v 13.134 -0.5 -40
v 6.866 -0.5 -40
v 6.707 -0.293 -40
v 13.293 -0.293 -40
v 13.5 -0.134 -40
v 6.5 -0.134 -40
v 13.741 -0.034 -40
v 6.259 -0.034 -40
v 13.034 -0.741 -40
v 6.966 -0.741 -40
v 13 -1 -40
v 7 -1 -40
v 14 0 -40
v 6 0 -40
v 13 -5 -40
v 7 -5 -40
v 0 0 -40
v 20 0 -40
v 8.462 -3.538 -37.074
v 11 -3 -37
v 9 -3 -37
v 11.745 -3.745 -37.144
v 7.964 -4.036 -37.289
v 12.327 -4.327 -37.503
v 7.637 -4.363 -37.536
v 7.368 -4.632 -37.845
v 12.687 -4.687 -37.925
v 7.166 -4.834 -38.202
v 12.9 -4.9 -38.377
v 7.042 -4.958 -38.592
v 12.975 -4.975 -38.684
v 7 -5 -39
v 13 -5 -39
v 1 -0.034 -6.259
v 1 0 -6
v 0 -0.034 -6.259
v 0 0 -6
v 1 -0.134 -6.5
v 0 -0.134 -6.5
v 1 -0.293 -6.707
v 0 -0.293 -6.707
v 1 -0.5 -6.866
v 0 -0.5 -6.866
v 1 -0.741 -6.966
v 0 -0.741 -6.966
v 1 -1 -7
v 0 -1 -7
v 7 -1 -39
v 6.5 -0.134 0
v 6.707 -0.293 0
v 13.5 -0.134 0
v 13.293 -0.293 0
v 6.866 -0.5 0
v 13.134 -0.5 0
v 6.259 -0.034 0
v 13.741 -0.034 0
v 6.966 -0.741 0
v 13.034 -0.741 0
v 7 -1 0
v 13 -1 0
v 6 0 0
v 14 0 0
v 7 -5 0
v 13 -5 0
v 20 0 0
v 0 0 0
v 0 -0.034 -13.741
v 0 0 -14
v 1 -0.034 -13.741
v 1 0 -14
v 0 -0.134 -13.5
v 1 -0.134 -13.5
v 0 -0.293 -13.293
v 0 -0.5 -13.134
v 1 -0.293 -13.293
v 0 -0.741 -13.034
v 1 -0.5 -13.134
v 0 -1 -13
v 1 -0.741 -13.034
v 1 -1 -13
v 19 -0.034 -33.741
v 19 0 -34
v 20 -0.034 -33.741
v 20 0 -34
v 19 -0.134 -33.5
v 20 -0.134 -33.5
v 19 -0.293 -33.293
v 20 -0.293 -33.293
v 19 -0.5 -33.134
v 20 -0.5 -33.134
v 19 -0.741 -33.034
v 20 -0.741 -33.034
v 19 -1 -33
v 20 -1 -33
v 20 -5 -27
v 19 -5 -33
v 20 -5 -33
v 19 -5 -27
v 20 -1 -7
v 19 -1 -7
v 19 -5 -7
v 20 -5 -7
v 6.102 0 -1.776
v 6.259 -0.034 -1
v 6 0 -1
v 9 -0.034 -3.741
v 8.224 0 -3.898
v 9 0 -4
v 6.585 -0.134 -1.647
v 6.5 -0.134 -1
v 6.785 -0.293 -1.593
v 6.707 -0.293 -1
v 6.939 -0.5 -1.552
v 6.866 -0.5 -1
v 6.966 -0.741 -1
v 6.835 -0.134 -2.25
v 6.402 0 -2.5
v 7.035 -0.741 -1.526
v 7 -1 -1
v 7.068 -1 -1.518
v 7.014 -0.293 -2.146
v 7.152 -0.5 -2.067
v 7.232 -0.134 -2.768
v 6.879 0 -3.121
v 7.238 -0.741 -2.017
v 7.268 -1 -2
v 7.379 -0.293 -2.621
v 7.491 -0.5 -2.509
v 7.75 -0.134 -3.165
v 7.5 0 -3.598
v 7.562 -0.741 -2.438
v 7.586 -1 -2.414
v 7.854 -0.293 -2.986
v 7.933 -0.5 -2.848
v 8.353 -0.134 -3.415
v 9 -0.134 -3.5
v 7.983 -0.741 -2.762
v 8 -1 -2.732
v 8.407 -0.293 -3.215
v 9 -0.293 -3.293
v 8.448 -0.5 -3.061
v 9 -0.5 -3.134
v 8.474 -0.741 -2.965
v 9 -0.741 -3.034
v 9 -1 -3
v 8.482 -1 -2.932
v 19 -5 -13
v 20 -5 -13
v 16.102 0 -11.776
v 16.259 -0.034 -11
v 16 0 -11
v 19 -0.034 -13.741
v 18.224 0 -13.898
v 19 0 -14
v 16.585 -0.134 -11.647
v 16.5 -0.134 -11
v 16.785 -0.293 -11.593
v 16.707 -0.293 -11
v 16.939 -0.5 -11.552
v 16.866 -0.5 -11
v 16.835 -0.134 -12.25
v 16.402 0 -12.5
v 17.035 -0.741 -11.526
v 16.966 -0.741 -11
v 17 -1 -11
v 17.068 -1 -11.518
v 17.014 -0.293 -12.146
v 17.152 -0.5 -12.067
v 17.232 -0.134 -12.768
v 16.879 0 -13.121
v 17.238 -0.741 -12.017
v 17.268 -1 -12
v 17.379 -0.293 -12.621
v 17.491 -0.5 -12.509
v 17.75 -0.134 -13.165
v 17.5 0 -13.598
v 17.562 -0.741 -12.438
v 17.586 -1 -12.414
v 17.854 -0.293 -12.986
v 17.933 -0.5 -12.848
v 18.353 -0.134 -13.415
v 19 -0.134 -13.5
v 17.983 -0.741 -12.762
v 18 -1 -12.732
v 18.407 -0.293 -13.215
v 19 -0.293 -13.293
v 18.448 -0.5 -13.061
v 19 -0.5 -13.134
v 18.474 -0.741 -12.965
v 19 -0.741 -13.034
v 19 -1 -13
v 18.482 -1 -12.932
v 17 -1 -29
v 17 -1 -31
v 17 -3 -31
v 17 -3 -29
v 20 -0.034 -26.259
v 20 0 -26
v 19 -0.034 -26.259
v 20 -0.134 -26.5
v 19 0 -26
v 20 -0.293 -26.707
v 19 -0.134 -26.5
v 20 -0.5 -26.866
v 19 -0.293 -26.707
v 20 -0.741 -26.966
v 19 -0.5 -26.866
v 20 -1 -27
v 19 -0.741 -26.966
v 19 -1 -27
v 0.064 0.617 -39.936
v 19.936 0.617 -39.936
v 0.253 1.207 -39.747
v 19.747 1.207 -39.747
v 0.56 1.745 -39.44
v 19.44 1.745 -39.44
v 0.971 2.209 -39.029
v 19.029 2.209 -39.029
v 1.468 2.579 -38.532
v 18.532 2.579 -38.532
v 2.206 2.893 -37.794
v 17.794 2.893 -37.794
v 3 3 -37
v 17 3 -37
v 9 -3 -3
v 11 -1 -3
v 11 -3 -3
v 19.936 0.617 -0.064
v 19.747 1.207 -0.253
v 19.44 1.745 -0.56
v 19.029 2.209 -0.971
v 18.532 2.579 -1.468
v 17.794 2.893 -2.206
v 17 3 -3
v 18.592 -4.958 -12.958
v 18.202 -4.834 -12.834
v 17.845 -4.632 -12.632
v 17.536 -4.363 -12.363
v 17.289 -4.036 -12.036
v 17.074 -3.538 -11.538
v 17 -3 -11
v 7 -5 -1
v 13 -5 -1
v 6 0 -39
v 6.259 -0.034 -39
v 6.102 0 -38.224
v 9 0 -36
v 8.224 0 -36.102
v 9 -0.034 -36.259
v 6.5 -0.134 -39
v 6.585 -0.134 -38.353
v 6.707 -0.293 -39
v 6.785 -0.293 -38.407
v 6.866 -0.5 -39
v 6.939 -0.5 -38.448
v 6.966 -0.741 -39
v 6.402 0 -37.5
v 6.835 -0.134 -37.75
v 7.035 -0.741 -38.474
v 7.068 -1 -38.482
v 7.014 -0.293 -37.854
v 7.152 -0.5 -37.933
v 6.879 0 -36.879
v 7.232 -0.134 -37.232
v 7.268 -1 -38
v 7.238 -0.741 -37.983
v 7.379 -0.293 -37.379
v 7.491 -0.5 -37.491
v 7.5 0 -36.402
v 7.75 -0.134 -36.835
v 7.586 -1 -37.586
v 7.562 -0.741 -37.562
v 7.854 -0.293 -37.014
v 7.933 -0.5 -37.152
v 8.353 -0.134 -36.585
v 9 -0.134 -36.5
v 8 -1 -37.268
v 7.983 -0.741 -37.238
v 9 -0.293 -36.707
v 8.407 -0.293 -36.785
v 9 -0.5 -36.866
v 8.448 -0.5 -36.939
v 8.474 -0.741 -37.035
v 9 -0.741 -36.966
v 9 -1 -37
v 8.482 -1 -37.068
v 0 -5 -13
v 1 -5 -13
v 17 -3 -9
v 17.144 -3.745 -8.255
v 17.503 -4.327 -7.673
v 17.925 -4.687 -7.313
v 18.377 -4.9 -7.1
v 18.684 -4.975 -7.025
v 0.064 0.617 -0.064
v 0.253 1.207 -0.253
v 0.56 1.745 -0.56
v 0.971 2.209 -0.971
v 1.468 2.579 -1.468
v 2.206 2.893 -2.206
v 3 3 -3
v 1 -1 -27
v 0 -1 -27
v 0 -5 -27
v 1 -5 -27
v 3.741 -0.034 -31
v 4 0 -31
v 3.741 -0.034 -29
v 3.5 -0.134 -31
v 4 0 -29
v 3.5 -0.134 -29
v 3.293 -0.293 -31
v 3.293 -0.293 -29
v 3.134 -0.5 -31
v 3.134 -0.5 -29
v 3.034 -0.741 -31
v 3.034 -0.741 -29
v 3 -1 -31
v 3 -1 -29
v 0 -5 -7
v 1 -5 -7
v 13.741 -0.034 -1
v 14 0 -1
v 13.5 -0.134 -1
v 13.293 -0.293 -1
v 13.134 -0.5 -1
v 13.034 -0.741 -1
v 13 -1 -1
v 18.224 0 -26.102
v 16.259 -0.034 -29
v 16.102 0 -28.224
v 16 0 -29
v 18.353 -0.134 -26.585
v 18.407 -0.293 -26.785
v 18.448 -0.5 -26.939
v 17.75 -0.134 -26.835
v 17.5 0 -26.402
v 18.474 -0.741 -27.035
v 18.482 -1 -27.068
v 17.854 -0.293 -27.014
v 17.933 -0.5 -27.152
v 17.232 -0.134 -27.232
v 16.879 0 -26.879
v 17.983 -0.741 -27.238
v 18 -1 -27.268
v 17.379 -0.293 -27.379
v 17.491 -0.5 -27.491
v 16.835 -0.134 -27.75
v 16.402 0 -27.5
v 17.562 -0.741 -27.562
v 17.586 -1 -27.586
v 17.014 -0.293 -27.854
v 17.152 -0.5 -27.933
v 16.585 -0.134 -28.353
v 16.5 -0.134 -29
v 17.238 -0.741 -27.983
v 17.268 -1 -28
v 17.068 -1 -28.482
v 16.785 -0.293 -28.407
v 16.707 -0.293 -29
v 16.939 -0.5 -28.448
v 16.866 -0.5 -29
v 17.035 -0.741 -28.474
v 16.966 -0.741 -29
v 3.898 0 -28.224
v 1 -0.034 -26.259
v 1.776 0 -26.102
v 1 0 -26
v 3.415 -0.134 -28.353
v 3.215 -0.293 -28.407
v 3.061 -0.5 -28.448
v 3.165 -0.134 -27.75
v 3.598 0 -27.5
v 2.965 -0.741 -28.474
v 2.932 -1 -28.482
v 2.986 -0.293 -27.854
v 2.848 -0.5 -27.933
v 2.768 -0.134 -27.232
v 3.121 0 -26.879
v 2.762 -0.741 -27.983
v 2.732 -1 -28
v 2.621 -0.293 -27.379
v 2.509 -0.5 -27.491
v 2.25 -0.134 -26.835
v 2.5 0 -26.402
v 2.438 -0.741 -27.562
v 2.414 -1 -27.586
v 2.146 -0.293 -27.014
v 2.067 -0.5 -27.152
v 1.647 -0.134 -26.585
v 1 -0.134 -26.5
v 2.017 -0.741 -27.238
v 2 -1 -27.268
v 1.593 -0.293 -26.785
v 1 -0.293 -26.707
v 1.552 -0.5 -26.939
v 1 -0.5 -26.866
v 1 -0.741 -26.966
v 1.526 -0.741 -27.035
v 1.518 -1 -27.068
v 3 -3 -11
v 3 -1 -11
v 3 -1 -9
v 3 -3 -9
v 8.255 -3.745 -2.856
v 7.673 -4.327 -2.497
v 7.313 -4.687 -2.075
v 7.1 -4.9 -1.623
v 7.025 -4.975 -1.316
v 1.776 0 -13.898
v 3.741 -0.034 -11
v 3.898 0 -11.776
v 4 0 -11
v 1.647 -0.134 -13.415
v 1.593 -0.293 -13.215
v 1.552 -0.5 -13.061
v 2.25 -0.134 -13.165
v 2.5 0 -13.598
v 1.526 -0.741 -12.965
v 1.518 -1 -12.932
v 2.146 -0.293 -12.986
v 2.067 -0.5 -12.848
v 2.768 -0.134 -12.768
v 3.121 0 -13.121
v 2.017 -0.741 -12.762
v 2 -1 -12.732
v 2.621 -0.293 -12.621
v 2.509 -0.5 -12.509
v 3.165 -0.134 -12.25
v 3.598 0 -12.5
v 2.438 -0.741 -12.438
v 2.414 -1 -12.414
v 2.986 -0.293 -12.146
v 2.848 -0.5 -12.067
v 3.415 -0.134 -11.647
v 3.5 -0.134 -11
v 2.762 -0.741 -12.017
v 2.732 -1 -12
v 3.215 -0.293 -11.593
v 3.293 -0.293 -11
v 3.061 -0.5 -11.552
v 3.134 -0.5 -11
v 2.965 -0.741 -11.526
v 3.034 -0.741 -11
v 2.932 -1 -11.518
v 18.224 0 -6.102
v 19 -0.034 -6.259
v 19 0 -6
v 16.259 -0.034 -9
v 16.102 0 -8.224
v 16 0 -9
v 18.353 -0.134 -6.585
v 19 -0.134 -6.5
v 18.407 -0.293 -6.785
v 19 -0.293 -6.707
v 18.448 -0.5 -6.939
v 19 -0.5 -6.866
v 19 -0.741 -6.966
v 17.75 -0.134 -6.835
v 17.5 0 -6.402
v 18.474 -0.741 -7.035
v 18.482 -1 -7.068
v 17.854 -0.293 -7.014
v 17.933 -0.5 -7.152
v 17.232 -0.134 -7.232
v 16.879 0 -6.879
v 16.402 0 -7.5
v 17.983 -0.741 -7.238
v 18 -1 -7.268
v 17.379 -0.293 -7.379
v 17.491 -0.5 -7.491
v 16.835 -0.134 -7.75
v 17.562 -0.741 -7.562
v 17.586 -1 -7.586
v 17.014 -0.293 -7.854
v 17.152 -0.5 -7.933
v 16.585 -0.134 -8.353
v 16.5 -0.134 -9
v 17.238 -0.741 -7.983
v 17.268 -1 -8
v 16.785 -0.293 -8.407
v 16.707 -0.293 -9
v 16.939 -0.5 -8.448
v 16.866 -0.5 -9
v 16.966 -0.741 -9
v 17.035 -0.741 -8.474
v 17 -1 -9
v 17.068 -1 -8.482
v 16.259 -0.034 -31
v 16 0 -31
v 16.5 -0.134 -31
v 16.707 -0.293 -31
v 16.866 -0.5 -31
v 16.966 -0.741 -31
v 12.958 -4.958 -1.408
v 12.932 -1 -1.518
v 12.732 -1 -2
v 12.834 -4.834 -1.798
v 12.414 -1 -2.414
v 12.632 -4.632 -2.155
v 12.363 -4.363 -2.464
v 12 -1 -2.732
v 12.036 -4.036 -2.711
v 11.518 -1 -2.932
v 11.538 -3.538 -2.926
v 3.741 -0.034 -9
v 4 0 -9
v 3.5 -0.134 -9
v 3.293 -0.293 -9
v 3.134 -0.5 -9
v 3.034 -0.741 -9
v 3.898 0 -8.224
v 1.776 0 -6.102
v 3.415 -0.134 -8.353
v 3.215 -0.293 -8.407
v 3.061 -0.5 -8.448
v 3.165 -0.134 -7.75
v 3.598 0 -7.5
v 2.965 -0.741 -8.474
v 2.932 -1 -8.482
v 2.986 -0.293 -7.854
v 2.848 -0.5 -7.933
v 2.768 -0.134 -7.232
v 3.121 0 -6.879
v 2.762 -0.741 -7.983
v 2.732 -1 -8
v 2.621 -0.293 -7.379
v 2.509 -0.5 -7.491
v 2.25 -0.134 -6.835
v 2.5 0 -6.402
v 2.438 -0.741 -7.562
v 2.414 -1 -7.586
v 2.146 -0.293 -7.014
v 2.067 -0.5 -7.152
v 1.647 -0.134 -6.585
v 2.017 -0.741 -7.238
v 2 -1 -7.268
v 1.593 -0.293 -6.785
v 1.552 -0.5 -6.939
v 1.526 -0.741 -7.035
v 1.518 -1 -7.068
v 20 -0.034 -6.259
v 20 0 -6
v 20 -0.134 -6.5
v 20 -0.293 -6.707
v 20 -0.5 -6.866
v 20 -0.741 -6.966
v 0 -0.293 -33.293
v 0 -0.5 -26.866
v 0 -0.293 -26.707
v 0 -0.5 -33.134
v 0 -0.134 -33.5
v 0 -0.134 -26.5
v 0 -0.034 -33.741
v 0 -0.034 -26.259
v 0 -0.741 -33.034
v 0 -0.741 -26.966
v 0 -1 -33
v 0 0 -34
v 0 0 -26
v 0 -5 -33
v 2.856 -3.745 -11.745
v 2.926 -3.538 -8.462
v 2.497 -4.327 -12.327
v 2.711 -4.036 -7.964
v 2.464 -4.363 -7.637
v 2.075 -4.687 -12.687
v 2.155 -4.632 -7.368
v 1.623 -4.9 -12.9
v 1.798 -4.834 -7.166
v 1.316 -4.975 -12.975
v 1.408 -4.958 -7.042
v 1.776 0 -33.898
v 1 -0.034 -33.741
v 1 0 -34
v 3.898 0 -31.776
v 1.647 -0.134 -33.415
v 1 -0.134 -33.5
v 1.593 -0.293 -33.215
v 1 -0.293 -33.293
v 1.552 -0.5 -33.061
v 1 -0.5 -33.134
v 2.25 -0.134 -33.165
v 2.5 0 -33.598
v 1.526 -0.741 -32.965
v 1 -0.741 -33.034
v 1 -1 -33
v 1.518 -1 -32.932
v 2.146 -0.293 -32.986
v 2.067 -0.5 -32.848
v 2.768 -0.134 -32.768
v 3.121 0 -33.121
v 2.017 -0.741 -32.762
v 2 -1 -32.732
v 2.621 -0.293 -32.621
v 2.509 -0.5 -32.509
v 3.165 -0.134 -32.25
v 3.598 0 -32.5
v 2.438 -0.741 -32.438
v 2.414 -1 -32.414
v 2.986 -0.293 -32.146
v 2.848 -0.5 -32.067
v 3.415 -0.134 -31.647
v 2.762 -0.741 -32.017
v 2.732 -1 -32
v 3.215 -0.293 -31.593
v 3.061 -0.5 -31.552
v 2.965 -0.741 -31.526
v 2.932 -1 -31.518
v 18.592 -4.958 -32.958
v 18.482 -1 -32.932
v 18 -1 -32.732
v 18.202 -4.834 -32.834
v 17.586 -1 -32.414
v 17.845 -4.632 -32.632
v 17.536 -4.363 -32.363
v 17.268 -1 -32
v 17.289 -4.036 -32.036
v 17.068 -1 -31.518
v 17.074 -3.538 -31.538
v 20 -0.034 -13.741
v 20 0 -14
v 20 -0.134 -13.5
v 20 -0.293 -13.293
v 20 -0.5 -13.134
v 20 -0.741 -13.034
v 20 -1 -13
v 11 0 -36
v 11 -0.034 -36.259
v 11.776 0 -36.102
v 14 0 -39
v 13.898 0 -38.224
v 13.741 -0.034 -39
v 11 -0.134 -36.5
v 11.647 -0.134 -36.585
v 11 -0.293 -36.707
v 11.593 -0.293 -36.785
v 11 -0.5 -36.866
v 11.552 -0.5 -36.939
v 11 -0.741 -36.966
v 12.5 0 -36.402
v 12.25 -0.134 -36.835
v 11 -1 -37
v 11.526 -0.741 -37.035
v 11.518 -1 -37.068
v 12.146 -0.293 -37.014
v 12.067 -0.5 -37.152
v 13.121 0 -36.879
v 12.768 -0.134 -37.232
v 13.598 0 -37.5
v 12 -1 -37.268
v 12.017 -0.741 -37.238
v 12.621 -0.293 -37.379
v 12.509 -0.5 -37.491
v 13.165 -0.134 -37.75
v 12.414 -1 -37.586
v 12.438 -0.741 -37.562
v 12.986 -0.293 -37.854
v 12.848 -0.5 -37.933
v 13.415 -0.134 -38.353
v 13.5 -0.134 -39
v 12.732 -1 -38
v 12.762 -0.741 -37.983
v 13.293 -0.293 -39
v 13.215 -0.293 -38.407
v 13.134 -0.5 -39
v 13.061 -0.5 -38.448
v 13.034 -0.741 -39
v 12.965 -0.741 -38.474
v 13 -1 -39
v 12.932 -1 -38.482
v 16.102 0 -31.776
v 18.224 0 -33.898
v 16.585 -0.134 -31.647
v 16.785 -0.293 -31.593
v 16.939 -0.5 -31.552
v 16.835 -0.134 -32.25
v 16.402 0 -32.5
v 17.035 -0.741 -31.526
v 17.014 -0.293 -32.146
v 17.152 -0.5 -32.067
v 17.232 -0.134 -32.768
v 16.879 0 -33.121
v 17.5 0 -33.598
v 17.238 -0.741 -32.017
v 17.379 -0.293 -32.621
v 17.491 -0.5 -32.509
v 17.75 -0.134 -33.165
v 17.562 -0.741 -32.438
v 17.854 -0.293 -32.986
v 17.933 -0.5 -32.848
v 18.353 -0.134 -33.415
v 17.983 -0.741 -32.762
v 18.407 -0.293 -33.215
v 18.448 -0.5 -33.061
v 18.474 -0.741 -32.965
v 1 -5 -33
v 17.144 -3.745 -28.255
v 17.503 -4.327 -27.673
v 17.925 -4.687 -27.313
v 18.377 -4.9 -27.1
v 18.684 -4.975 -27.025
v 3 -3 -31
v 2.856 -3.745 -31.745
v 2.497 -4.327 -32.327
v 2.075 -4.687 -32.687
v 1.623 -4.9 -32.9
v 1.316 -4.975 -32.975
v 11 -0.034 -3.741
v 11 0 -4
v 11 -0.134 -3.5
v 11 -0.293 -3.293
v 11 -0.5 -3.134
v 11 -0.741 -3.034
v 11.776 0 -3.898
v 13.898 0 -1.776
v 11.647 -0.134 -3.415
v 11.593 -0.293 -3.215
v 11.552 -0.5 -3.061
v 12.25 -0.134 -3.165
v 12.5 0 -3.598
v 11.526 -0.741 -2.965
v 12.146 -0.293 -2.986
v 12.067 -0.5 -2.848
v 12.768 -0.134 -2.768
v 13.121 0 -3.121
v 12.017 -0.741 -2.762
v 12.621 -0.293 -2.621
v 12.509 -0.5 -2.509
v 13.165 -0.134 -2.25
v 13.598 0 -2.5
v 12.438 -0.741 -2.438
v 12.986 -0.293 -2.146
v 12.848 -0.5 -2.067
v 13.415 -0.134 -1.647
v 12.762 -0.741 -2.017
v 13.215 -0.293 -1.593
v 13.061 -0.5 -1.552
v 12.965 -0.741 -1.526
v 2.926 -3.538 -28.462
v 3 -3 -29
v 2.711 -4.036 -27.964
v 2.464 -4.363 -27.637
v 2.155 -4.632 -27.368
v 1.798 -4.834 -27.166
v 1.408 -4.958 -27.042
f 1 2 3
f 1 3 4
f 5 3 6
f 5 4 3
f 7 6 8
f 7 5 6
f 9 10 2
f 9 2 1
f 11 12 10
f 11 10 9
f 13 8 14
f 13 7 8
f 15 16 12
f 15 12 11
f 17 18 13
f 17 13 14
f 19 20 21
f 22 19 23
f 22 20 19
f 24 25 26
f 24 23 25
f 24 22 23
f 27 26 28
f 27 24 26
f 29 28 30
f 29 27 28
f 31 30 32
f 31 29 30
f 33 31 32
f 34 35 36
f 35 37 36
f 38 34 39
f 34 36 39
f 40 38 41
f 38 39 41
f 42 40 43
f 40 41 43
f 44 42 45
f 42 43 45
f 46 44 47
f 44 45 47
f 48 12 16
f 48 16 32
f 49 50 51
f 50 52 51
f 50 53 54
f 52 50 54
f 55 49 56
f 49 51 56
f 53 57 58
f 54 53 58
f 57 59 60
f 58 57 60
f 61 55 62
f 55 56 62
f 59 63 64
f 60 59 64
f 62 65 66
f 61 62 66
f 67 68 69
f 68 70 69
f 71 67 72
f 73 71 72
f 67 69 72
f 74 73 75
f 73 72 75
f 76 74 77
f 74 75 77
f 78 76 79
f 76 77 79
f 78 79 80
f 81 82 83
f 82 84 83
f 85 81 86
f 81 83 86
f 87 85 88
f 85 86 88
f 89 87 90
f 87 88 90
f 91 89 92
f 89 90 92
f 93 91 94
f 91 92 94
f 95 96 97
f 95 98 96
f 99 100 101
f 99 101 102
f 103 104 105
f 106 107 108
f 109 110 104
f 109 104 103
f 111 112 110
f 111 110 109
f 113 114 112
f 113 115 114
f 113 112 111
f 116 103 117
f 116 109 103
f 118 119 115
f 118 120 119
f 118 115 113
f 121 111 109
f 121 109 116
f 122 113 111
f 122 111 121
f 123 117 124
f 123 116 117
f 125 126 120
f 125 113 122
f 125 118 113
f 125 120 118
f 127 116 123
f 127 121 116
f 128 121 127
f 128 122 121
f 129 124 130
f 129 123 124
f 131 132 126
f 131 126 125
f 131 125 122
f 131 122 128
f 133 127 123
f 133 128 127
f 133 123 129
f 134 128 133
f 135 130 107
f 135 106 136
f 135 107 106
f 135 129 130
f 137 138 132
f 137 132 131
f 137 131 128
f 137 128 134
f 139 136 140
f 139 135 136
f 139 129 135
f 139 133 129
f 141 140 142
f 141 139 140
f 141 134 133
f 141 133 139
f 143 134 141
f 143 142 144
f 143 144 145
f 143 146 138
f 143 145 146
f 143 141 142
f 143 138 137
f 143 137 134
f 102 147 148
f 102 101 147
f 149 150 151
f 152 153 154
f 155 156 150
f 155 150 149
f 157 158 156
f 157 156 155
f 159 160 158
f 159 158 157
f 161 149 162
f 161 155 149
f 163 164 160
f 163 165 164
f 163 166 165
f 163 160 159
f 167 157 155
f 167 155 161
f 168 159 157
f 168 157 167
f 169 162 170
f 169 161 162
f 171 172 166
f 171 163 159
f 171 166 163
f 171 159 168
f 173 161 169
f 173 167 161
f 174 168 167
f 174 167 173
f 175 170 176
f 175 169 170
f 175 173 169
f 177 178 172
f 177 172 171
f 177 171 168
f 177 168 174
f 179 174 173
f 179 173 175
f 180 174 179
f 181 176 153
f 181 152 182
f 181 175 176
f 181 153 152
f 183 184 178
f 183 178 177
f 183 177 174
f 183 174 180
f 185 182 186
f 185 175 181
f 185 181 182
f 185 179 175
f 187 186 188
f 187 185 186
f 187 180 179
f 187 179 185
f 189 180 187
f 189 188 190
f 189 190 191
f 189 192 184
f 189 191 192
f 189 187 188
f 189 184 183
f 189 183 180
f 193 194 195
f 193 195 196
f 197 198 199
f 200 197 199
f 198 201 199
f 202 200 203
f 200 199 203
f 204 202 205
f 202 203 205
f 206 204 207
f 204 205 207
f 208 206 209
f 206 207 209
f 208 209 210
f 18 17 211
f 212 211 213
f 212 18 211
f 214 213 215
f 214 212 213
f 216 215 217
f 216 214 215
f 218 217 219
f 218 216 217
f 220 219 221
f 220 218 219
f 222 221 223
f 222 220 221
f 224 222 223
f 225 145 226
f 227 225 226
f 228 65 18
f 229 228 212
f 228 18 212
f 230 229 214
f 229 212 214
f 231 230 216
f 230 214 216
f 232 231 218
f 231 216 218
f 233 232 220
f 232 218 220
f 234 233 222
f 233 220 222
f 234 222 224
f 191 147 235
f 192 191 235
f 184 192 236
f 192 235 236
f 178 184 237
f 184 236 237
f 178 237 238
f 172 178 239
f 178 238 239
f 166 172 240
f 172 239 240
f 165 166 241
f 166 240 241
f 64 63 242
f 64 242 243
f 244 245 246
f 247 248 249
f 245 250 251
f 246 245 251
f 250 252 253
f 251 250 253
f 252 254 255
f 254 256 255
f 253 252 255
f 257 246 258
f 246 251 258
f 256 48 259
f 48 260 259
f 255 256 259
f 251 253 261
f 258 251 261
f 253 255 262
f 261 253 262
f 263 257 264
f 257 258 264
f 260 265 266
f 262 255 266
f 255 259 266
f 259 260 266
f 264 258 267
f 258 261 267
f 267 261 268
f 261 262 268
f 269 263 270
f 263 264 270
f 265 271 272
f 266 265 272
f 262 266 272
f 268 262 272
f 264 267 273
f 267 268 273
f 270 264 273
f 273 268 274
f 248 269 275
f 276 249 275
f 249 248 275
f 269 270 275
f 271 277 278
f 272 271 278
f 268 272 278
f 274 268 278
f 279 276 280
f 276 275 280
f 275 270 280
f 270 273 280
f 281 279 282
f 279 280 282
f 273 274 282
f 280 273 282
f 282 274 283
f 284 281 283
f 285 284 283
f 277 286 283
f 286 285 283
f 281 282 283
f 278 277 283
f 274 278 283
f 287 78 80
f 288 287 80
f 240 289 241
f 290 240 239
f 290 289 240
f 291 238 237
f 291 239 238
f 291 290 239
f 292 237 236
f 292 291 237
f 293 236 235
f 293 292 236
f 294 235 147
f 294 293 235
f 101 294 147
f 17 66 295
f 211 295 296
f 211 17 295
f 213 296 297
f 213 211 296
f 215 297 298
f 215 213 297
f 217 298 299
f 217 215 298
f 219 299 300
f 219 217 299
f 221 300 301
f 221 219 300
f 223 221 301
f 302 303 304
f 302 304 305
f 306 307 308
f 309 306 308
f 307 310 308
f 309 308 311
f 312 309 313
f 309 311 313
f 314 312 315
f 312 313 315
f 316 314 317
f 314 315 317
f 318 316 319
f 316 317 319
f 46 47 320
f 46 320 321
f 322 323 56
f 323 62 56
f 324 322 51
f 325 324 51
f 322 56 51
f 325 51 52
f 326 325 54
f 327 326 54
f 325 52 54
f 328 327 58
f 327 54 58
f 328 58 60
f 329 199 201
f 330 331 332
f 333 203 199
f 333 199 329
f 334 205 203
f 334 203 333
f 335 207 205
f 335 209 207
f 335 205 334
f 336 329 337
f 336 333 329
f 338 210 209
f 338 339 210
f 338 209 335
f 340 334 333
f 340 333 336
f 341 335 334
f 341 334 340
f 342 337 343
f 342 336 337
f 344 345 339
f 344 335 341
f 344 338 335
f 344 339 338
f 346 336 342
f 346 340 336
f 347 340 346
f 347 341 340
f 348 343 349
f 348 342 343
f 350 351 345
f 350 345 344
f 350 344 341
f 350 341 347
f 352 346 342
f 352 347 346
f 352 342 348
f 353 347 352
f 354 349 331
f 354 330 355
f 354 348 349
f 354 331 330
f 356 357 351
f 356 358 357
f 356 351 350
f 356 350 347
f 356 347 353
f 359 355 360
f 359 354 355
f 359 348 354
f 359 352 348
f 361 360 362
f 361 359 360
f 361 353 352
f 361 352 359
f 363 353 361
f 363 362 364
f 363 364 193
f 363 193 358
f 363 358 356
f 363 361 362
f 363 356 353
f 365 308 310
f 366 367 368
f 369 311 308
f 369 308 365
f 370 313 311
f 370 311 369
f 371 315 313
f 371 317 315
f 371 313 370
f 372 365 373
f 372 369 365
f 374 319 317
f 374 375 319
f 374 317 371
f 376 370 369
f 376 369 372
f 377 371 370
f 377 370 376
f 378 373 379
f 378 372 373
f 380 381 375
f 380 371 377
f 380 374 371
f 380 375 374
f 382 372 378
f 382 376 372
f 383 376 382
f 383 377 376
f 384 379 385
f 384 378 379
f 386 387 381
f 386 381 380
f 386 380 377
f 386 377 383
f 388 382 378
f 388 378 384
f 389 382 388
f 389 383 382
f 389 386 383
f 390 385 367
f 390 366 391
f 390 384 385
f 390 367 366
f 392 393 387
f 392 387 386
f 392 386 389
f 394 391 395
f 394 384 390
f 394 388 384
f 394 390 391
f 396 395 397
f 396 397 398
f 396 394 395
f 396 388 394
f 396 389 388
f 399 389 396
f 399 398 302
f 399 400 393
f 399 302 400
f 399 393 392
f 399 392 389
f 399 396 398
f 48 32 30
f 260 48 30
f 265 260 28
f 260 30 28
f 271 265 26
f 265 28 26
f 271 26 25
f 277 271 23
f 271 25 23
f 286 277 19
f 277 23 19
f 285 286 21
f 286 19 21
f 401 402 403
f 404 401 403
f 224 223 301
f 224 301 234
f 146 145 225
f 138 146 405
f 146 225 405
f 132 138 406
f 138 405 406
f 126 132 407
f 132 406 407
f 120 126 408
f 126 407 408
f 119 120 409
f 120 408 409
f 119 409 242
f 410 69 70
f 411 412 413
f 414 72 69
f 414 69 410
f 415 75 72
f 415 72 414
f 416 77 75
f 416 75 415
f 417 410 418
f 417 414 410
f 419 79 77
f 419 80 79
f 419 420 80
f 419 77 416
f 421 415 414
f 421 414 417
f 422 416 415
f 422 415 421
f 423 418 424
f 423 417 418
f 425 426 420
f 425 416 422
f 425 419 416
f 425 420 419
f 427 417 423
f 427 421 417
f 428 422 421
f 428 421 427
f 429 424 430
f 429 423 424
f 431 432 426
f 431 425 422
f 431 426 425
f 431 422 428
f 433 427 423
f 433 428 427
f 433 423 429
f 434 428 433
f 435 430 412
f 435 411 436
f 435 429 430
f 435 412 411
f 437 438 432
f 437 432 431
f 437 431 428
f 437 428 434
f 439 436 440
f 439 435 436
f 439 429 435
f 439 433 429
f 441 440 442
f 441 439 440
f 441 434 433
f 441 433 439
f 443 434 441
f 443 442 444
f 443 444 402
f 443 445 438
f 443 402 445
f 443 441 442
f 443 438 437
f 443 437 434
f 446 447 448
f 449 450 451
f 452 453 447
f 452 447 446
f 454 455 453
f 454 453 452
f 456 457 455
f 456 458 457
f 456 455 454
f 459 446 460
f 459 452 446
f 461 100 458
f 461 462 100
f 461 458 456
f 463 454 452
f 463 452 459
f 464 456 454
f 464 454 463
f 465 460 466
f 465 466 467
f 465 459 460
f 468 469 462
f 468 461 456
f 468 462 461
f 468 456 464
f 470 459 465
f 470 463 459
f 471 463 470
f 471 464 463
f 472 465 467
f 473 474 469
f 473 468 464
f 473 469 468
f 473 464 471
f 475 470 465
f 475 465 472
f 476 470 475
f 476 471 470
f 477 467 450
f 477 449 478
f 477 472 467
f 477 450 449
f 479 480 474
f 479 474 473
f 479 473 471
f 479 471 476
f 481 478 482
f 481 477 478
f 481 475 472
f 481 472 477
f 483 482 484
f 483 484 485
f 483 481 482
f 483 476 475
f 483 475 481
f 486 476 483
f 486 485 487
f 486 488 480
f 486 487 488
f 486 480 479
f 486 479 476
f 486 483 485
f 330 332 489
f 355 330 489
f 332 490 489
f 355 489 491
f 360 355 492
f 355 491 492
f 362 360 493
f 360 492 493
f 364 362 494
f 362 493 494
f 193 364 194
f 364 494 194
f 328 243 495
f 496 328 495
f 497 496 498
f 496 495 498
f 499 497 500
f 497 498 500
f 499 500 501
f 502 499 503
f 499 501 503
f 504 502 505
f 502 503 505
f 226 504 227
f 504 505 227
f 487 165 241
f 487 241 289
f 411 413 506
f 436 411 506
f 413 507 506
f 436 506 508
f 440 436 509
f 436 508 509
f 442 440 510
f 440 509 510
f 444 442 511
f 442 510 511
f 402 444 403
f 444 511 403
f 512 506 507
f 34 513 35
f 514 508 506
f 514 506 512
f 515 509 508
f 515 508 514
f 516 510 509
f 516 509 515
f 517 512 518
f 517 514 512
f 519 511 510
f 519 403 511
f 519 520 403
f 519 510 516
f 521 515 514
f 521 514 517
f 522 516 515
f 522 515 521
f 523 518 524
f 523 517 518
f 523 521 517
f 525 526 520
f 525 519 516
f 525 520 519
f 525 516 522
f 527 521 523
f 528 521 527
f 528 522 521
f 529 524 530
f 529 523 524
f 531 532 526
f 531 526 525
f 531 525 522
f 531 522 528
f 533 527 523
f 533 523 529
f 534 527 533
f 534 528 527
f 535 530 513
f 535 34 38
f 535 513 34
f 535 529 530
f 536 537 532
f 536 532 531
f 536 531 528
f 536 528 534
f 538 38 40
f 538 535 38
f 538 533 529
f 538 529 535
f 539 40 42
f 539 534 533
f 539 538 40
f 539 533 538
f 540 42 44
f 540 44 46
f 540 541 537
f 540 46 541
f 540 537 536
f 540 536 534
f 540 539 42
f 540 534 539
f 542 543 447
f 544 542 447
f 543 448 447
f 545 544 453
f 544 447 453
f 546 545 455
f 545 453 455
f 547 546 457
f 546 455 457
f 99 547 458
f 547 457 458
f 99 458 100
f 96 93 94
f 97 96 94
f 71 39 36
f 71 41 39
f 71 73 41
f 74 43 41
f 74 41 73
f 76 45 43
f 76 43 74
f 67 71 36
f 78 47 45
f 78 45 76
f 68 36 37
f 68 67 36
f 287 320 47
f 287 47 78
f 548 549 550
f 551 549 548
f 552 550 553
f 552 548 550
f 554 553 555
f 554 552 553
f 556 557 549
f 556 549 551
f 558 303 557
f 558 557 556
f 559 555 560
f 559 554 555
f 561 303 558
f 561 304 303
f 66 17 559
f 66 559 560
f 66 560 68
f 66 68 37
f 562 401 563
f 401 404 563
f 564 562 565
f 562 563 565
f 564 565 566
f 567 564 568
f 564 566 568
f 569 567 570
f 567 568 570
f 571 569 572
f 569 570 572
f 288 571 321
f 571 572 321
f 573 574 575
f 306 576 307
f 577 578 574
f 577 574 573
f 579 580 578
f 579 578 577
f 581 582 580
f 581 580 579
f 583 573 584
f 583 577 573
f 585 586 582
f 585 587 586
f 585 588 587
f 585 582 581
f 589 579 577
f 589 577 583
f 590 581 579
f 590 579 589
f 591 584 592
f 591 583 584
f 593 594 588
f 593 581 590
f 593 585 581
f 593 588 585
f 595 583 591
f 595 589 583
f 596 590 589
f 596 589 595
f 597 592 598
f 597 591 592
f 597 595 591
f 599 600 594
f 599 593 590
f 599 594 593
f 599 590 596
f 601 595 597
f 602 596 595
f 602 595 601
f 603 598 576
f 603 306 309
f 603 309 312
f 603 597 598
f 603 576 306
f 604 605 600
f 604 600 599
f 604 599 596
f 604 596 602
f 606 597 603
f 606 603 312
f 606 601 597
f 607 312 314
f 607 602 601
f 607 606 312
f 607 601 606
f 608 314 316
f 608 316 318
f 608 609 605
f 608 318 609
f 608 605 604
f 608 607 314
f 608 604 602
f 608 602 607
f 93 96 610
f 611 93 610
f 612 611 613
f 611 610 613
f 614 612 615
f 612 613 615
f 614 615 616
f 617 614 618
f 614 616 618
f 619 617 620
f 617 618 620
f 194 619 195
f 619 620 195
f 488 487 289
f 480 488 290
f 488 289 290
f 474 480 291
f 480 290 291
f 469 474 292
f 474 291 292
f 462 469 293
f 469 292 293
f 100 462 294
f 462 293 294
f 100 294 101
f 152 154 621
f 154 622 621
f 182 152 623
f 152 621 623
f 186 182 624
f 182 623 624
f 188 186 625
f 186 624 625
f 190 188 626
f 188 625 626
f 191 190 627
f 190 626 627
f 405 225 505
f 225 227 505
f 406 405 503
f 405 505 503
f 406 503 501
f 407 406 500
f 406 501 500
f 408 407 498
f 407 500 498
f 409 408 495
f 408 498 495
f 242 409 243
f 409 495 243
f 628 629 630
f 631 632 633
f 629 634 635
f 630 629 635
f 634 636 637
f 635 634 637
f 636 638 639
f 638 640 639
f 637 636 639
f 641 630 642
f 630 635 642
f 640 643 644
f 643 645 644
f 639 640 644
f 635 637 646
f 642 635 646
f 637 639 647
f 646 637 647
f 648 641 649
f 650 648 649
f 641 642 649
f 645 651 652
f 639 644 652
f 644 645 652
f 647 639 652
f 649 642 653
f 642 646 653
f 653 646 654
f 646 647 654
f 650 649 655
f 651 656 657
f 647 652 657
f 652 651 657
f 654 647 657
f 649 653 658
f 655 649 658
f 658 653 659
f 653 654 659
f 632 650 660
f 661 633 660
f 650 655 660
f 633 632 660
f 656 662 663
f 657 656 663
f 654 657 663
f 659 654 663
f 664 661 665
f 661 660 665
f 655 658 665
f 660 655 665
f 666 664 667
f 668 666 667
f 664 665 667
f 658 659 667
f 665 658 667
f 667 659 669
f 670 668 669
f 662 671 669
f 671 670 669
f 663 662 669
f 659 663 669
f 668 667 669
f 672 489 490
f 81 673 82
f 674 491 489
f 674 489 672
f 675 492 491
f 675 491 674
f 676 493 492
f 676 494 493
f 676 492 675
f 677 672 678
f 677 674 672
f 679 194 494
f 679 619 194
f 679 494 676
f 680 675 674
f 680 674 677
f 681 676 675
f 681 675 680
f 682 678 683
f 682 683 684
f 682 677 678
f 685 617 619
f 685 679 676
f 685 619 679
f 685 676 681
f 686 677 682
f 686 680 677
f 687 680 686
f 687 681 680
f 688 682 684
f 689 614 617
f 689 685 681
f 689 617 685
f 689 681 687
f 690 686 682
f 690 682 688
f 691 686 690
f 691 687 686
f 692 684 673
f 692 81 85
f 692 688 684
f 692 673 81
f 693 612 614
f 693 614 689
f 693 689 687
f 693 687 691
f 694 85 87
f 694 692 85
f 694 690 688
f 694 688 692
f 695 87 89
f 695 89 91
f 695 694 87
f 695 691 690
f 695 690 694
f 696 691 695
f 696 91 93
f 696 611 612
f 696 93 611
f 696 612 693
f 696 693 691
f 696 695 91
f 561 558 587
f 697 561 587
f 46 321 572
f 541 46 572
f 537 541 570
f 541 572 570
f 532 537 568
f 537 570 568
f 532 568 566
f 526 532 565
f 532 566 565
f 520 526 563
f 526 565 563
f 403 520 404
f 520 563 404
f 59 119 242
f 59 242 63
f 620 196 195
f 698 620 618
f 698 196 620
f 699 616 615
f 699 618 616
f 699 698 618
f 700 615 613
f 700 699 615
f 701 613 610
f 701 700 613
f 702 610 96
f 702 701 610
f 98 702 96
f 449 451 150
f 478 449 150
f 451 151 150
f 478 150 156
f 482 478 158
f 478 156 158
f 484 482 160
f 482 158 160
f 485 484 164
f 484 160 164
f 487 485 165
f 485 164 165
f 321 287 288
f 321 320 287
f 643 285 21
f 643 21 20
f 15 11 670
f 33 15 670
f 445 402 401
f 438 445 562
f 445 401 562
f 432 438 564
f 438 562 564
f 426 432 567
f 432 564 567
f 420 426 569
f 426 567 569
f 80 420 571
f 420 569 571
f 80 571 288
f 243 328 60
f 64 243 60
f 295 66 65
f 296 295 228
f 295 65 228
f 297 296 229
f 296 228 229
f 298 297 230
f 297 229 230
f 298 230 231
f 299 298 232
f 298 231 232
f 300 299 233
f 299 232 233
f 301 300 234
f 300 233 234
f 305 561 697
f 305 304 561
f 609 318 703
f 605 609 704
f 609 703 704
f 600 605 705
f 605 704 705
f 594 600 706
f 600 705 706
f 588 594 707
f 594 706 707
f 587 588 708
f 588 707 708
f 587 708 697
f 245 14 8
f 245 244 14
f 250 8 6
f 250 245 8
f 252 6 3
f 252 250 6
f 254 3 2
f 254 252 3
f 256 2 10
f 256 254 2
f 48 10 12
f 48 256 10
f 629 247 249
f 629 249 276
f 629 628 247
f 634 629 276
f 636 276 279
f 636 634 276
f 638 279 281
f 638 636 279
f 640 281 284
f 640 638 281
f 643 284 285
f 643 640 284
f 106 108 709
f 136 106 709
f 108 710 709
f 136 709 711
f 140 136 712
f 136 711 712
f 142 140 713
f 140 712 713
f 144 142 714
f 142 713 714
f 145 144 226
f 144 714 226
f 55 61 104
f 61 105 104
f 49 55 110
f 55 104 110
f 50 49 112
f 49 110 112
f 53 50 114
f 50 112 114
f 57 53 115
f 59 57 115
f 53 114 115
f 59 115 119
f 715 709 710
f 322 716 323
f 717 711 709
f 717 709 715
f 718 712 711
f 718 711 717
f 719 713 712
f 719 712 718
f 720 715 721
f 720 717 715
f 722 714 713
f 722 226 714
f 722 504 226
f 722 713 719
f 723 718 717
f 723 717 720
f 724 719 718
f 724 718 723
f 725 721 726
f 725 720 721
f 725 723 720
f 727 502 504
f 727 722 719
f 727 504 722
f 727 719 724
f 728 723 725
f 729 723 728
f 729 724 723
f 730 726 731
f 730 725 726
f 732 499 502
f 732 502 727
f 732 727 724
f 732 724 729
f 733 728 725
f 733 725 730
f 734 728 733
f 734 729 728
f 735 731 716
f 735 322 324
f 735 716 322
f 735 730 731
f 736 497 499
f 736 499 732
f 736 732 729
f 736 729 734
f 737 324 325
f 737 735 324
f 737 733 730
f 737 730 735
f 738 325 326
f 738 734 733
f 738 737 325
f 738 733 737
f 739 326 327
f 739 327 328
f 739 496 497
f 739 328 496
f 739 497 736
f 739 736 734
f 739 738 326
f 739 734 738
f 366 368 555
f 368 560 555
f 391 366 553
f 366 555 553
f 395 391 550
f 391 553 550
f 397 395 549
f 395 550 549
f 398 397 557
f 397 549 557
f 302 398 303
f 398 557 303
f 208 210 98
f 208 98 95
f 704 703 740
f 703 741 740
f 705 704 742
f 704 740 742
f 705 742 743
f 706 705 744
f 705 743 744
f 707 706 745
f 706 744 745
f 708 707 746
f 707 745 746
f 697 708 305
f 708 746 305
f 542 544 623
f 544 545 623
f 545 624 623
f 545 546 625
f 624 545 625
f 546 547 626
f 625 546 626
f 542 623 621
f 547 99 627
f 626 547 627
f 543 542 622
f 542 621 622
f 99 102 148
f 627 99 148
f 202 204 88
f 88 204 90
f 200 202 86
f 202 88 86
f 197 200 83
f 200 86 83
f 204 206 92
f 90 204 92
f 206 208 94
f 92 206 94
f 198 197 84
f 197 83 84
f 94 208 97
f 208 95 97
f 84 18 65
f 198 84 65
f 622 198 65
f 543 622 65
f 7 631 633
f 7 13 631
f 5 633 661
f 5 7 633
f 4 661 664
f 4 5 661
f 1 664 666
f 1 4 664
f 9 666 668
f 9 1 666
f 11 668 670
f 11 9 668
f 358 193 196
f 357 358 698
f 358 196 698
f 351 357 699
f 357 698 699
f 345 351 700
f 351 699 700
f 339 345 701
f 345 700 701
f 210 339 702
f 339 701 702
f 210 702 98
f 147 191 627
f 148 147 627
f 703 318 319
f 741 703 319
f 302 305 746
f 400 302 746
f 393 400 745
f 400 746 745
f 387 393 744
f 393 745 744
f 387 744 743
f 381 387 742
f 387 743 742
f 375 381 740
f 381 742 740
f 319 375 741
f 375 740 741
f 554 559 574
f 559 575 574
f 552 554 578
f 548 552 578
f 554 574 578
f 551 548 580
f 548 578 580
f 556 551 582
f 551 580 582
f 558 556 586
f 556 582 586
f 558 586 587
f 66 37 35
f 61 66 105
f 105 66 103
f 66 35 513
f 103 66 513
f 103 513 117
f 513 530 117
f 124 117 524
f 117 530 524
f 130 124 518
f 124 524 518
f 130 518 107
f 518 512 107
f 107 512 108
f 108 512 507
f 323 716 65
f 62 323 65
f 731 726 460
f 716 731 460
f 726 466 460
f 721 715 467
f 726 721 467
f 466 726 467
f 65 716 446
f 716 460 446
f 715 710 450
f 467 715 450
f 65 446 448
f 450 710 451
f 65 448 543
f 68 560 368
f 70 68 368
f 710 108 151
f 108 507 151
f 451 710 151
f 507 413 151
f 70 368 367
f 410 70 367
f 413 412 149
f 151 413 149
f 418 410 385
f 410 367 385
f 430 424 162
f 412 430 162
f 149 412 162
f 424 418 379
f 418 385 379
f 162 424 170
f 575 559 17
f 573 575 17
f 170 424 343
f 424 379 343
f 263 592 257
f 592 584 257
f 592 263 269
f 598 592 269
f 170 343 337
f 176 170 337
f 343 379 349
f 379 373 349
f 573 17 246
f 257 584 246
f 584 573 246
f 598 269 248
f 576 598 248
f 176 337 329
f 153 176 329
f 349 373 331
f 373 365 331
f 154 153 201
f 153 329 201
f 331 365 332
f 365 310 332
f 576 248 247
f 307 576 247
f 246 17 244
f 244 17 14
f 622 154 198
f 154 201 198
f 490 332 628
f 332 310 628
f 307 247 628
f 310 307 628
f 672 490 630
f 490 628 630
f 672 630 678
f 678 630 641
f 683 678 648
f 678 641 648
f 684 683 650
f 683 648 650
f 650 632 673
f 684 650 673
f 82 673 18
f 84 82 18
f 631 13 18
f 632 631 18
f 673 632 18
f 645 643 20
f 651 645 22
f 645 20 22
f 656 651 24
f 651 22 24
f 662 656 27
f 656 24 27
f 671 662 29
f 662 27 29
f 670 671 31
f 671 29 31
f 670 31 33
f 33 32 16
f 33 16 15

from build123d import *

# Parameters (mm, degrees)
ESBO_O1_W                = 20
ESBO_O1_H                = 40
RESSALTO_EXTRUS_O1_DEPTH = 3
FILETE1_R                = 3
ESBO_O2_W                = 6
ESBO_O2_H                = 3
ESBO_O2_W_2              = 3
ESBO_O2_H_2              = 6
RESSALTO_EXTRUS_O2_DEPTH = 5
FILETE2_R                = 2
FILETE3_R                = 1


with BuildPart() as part:
    # Esboço1 → Ressalto-extrusão1 (new body)
    with BuildSketch(Plane(origin=(0, 0, 0), x_dir=(1, 0, 0), z_dir=(0, 1, 0))):
        with Locations((10, 20)):
            Rectangle(ESBO_O1_W, ESBO_O1_H)
    extrude(amount=RESSALTO_EXTRUS_O1_DEPTH)

    # Filete1
    filete1_edges = [part.edges().sort_by_distance(p)[0] for p in [
        (10, 3, -40),
        (20, 3, -20),
        (10, 3, 0),
        (0, 3, -20),
    ]]
    fillet(filete1_edges, radius=FILETE1_R - 0.0001)  # a hair under: the kernel refuses the full size

    # Esboço2 → Ressalto-extrusão2 (add)
    with BuildSketch(Plane.XZ):
        with Locations((10, -1.5)):
            Rectangle(ESBO_O2_W, ESBO_O2_H)
        with Locations((10, -38.5)):
            Rectangle(ESBO_O2_W, ESBO_O2_H)
        with Locations((1.5, -30)):
            Rectangle(ESBO_O2_W_2, ESBO_O2_H_2)
        with Locations((18.5, -10)):
            Rectangle(ESBO_O2_W_2, ESBO_O2_H_2)
        with Locations((18.5, -30)):
            Rectangle(ESBO_O2_W_2, ESBO_O2_H_2)
        with Locations((1.5, -10)):
            Rectangle(ESBO_O2_W_2, ESBO_O2_H_2)
    extrude(amount=RESSALTO_EXTRUS_O2_DEPTH)

    # Filete2
    filete2_edges = [part.edges().sort_by_distance(p)[0] for p in [
        (13, -2.5, -3),
        (7, -2.5, -3),
        (10, -5, -3),
        (7, -2.5, -37),
        (13, -2.5, -37),
        (10, -5, -37),
        (17, -2.5, -7),
        (17, -2.5, -13),
        (17, -5, -10),
        (17, -2.5, -27),
        (17, -2.5, -33),
        (17, -5, -30),
        (3, -2.5, -33),
        (3, -2.5, -27),
        (3, -5, -30),
        (3, -2.5, -13),
        (3, -2.5, -7),
        (3, -5, -10),
    ]]
    fillet(filete2_edges, radius=FILETE2_R)

    # Filete3
    filete3_edges = [part.edges().sort_by_distance(p)[0] for p in [
        (3, 0, -30),
        (0.5, 0, -27),
        (19.5, 0, -33),
        (17, 0, -30),
        (19.5, 0, -13),
        (17, 0, -10),
        (10, 0, -3),
        (13, 0, -0.5),
        (3, 0, -10),
        (0.5, 0, -7),
        (7.585786438, 0, -37.585786438),
        (12.414213562, 0, -37.585786438),
        (2.414213562, 0, -32.414213562),
        (2.414213562, 0, -27.585786438),
        (17.585786438, 0, -32.414213562),
        (17.585786438, 0, -27.585786438),
        (17.585786438, 0, -12.414213562),
        (17.585786438, 0, -7.585786438),
        (7.585786438, 0, -2.414213562),
        (12.414213562, 0, -2.414213562),
        (2.414213562, 0, -12.414213562),
        (2.414213562, 0, -7.585786438),
        (7, 0, -0.5),
        (13, 0, -39.5),
        (19.5, 0, -7),
        (19.5, 0, -27),
        (0.5, 0, -33),
        (0.5, 0, -13),
        (7, 0, -39.5),
        (10, 0, -37),
    ]]
    fillet(filete3_edges, radius=FILETE3_R)


solid = part.part
